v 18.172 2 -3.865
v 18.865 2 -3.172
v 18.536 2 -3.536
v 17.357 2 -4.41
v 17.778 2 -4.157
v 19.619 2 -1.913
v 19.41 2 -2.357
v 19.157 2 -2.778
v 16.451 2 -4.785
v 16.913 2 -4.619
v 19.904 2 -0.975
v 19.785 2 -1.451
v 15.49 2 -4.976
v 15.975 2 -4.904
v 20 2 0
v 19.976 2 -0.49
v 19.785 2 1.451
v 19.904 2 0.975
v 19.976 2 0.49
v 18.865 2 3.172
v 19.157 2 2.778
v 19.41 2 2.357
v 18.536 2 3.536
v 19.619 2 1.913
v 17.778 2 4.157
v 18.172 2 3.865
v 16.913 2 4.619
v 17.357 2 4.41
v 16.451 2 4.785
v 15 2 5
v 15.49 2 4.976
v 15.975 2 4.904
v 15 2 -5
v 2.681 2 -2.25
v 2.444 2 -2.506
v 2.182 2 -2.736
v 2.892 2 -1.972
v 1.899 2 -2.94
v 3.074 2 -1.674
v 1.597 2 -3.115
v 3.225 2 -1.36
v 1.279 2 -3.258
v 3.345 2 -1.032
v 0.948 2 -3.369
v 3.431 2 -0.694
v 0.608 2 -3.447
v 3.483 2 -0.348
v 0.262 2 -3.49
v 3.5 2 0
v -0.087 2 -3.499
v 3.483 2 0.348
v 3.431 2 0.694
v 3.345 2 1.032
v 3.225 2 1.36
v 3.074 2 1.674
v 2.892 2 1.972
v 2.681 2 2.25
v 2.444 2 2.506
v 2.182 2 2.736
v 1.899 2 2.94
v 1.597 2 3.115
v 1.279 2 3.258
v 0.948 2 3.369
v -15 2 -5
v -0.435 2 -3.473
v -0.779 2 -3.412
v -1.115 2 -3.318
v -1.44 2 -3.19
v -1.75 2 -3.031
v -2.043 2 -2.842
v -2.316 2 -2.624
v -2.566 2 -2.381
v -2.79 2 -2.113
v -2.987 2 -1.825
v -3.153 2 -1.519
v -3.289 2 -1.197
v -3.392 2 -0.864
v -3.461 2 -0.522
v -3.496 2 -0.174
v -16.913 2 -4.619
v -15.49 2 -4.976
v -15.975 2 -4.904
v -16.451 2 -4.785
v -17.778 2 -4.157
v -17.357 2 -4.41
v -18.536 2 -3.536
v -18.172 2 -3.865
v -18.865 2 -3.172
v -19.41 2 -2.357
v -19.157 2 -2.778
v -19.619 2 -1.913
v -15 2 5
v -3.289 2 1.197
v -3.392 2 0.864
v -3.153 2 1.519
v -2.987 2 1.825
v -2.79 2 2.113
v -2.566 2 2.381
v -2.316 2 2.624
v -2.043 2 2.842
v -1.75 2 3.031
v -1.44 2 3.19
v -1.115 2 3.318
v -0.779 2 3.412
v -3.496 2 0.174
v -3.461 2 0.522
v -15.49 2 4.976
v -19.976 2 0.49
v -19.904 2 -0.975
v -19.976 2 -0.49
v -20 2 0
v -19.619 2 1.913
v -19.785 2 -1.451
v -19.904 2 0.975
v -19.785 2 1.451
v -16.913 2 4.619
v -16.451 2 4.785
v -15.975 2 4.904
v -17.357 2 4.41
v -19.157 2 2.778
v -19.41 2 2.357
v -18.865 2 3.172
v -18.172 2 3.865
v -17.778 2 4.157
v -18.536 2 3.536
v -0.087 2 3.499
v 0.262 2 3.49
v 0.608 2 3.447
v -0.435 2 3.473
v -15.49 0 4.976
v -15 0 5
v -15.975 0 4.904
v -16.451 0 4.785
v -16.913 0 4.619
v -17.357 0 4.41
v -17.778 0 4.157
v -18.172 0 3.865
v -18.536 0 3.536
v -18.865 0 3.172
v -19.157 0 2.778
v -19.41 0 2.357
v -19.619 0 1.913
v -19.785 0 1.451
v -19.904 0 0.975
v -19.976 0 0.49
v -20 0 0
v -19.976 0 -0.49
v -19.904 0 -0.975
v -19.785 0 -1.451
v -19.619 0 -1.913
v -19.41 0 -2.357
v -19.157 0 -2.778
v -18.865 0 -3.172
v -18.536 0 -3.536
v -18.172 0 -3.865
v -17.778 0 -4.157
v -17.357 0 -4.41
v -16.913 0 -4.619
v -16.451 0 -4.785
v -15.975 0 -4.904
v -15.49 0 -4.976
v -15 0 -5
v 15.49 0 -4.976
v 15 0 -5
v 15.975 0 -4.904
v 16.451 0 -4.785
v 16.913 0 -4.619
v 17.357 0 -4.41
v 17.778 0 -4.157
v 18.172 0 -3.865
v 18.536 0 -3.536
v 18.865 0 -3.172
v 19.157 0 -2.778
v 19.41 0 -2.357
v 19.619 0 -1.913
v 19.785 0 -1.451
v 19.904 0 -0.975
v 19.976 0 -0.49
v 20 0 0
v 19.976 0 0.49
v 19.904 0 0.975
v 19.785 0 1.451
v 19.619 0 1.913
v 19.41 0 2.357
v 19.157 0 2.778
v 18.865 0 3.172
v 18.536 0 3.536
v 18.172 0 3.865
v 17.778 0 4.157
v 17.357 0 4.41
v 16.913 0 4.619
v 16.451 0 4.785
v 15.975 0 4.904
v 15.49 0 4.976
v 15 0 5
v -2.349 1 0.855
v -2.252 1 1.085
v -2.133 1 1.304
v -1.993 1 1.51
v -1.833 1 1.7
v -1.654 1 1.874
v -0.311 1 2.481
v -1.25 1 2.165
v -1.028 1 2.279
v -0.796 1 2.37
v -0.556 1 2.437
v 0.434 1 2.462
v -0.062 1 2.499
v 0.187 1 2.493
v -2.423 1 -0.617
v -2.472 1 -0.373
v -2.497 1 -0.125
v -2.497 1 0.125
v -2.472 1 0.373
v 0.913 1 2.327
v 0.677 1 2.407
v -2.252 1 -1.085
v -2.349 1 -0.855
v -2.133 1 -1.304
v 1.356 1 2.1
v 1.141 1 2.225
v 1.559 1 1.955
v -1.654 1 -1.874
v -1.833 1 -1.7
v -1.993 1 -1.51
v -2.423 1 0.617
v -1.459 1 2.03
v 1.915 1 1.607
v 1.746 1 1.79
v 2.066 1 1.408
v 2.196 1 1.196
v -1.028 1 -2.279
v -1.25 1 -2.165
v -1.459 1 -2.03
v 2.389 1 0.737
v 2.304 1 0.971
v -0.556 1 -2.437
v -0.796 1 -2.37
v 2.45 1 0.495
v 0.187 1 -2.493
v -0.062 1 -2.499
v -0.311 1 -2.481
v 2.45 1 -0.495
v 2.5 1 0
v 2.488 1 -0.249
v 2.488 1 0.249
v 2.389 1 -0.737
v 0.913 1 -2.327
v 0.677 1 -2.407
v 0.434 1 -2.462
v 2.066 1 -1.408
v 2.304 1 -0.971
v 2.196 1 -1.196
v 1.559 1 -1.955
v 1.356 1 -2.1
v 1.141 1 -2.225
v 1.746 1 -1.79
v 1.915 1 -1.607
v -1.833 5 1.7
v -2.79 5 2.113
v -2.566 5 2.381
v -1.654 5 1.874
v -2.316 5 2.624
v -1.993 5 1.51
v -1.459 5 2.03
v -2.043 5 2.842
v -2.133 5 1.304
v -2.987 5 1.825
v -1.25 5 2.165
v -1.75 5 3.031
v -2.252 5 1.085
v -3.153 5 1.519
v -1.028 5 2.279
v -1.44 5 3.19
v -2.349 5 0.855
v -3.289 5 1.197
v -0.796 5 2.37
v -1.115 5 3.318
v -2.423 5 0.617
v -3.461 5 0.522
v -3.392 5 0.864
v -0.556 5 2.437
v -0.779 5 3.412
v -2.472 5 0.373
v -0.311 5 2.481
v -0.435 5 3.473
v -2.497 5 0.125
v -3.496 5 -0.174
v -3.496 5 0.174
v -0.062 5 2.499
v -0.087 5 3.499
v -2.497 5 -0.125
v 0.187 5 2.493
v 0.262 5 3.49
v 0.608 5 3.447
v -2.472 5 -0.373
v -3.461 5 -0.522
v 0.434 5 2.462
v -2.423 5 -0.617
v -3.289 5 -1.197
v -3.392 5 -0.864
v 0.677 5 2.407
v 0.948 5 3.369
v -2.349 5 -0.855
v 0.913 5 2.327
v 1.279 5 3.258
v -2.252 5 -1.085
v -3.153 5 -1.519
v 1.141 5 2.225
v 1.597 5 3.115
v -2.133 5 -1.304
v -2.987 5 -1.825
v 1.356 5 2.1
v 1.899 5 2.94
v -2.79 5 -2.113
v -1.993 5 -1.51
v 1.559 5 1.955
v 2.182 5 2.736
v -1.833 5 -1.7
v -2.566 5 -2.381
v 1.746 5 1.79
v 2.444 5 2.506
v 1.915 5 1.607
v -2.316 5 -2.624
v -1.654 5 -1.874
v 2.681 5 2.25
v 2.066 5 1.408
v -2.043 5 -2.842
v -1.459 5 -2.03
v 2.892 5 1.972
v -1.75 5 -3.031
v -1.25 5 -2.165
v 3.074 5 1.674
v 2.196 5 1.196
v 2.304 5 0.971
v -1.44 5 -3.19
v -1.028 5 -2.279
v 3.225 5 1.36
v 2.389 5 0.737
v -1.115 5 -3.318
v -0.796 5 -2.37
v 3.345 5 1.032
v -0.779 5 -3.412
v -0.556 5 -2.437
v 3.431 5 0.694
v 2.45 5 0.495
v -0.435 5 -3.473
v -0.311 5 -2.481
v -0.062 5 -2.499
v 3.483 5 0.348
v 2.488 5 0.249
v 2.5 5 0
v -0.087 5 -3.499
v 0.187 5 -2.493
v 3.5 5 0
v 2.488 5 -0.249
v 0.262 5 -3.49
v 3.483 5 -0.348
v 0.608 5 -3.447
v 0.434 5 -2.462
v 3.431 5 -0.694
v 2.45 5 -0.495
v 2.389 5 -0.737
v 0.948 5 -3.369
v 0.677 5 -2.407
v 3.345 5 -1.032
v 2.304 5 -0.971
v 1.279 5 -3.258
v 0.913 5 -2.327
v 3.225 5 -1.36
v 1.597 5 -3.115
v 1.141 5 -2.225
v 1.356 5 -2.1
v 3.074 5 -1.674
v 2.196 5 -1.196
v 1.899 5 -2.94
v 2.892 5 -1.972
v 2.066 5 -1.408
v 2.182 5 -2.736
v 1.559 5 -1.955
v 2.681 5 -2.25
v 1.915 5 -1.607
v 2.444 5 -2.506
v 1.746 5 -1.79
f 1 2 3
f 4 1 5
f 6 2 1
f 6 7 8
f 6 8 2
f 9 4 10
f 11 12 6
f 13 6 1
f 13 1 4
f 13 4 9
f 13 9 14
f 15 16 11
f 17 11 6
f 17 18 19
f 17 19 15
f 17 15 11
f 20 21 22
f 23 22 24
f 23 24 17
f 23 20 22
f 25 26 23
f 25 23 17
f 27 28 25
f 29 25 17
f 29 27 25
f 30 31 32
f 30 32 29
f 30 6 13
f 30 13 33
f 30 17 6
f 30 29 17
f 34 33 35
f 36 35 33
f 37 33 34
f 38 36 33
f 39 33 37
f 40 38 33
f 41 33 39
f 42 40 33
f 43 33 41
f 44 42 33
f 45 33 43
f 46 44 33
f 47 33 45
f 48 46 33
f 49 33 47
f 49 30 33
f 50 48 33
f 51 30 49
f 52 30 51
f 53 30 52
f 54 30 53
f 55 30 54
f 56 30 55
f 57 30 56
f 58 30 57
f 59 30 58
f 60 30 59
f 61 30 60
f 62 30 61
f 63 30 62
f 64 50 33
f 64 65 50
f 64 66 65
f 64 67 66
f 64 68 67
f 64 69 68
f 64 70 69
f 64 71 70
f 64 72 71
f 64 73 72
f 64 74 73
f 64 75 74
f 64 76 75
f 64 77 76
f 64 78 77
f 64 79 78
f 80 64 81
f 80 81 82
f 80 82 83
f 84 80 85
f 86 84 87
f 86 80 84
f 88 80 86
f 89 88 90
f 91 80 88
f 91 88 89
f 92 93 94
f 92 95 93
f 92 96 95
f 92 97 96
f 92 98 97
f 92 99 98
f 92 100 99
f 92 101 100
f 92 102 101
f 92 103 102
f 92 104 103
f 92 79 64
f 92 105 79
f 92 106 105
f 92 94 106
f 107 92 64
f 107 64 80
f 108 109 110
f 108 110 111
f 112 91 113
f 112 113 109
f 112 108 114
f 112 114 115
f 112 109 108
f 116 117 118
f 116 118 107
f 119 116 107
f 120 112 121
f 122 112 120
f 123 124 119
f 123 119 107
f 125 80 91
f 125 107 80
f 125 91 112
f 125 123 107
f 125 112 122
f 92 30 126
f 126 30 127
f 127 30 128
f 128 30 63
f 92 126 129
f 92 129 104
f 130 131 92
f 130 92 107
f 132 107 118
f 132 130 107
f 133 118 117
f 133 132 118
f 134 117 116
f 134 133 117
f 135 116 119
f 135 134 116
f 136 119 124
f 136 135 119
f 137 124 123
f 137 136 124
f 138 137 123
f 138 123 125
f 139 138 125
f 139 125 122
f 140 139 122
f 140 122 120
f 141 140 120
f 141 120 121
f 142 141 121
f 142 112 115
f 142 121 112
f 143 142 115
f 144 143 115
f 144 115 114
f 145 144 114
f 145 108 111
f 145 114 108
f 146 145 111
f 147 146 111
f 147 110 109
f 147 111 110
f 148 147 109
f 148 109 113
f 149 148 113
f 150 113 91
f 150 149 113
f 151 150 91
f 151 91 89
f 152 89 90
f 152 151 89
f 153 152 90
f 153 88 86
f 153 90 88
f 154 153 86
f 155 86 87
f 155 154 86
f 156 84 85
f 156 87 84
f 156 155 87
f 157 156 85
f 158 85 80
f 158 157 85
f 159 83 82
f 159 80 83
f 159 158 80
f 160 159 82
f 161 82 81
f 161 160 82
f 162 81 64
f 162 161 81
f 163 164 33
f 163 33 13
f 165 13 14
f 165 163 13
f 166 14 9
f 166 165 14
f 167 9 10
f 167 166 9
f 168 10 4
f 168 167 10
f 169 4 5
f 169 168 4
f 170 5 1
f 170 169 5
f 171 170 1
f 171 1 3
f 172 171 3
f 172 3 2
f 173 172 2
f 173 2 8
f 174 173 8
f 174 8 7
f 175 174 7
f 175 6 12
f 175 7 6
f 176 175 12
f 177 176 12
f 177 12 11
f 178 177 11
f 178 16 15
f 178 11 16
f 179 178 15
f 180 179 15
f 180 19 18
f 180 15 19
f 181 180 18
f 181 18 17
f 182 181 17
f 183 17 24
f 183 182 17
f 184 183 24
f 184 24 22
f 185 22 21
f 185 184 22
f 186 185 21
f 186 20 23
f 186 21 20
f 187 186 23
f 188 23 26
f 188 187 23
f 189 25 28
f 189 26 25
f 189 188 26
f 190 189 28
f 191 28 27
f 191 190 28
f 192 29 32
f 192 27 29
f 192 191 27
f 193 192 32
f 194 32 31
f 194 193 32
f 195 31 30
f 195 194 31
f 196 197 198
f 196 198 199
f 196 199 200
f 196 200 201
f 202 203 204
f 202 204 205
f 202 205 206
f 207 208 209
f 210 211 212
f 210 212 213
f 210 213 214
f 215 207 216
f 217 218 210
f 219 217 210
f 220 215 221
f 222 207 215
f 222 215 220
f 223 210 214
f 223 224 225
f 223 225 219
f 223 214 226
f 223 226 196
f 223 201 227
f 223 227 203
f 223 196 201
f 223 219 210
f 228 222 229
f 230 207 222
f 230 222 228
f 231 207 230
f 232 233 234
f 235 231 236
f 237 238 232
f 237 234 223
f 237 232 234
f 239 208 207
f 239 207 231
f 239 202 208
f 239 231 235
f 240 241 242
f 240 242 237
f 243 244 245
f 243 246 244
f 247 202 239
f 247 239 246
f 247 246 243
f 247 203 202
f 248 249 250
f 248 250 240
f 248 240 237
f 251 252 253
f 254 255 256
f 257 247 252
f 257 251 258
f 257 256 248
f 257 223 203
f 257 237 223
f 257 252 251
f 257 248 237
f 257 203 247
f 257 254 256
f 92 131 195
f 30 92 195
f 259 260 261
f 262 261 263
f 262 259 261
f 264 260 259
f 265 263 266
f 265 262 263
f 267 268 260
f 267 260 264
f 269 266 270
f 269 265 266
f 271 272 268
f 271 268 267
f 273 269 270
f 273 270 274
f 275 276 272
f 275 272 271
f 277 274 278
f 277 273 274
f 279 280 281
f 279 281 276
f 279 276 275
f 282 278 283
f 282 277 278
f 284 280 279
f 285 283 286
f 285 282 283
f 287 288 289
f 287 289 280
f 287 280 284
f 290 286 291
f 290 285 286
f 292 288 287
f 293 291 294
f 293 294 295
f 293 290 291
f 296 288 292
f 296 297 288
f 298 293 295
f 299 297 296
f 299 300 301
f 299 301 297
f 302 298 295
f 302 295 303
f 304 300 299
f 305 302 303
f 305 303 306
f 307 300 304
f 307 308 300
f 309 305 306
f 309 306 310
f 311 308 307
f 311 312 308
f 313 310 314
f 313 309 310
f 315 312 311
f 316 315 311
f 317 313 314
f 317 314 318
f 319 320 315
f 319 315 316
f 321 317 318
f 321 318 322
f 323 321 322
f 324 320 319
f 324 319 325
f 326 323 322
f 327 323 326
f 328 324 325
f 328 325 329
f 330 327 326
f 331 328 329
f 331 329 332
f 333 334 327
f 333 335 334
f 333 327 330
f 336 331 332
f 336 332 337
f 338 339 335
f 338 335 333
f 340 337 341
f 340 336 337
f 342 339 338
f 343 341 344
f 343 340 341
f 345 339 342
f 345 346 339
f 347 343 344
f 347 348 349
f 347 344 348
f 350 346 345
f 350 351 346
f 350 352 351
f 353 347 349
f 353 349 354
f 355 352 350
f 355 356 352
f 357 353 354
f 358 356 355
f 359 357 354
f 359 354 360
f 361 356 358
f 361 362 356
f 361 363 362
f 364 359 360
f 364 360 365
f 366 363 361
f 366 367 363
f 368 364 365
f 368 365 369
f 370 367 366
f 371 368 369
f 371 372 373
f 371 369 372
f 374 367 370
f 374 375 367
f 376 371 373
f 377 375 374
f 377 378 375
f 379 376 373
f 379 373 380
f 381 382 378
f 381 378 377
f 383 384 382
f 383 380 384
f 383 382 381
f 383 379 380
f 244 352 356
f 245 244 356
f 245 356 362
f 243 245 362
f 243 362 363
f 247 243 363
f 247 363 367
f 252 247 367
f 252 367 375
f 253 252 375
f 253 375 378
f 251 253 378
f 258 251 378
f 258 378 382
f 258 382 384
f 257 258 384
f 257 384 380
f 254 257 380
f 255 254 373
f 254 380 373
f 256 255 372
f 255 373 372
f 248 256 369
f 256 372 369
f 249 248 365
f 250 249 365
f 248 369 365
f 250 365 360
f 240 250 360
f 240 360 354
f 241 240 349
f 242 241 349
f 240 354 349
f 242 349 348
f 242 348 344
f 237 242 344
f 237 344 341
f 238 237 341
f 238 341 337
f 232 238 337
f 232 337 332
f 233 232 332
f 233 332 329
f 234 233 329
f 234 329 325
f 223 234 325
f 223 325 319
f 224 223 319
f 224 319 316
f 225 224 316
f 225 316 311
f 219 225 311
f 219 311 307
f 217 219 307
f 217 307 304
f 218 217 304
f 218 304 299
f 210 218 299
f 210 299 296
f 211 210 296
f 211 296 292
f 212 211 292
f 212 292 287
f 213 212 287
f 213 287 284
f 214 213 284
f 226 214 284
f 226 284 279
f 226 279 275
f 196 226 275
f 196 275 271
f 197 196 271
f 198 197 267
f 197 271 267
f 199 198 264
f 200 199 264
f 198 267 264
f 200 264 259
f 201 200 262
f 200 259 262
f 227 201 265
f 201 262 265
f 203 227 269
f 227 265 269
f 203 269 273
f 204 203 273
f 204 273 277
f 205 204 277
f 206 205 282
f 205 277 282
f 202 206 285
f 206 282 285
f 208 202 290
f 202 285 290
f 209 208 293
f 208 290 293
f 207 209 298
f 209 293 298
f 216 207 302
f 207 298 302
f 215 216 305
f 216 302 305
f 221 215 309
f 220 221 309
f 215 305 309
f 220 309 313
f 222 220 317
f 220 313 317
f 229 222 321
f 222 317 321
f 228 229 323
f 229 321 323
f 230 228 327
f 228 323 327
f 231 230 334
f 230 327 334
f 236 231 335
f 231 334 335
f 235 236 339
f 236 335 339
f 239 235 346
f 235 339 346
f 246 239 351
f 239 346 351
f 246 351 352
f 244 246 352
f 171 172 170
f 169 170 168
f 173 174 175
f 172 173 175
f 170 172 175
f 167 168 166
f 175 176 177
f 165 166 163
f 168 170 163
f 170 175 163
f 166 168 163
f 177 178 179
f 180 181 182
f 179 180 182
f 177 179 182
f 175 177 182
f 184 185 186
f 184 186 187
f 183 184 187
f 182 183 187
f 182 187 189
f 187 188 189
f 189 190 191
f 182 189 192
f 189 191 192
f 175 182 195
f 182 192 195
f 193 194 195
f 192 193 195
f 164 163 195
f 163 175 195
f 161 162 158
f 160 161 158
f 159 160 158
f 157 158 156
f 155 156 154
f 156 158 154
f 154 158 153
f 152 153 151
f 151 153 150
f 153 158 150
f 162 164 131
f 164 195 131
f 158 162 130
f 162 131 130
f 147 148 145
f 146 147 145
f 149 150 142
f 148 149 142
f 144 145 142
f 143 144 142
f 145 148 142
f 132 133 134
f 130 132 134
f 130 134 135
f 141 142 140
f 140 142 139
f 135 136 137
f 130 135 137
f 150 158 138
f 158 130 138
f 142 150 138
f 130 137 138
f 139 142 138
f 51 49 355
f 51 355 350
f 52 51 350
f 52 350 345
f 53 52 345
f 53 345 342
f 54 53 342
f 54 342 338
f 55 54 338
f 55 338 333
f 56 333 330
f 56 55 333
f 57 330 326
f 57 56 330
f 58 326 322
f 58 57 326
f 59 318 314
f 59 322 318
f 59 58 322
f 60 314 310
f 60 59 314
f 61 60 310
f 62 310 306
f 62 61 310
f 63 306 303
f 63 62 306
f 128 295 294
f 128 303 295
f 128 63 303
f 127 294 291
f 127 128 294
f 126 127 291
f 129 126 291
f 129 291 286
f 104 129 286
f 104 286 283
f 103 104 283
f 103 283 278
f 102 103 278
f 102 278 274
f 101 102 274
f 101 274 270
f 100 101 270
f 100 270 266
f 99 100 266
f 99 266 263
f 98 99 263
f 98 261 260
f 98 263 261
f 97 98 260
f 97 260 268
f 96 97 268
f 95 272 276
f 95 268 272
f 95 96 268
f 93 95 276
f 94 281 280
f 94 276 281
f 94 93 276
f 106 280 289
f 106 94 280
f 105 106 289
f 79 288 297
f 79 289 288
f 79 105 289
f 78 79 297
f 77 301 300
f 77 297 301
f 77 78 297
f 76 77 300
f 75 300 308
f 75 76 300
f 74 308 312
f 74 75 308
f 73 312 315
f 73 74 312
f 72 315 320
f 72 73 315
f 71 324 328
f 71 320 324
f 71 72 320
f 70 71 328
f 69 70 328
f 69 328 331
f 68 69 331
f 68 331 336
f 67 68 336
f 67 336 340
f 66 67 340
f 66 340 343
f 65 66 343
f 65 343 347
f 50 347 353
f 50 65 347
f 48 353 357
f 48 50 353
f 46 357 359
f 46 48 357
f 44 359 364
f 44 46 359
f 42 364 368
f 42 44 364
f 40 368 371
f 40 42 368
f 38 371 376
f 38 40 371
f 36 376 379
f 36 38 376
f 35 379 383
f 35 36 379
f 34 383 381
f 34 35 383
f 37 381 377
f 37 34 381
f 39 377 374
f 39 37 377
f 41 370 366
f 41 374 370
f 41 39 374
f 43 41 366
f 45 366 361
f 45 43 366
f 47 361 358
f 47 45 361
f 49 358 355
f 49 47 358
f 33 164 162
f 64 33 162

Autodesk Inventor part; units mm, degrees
ref_plane "YZ Plane" through (0, 0, 0) normal (1, 0, 0) x (0, 1, 0)
ref_plane "XZ Plane" through (0, 0, 0) normal (0, 1, 0) x (-1, 0, 0)
ref_plane "XY Plane" through (0, 0, 0) normal (0, 0, 1) x (1, 0, 0)
sketch "Sketch1" plane through (0, 0, 0) normal (0, 1, 0) x (-1, 0, 0)
  line L0 (15, 0) -> (-15, 0) construction
  line L1 (15, 5) -> (-15, 5)
  line L2 (-15, -5) -> (15, -5)
  arc A0 (15, -5) -> (15, 5) centre (15, 0) ccw
  arc A1 (-15, 5) -> (-15, -5) centre (-15, 0) ccw
  point P0 (0, 0)
  dimension "d0" = 15
  dimension "d1" = 10
extrude "Extrusion1" add sketch "Sketch1" along normal blind 2
sketch "Sketch2" plane through (0, 2, 0) normal (0, 1, 0) x (1, 0, 0)
  circle A0 centre (0, 0) radius 3.5
  dimension "d4" = 7
extrude "Extrusion2" add sketch "Sketch2" along normal blind 3
sketch "Sketch3" plane through (0, 5, 0) normal (0, 1, 0) x (1, 0, 0)
  circle A0 centre (0, 0) radius 2.5
  dimension "d7" = 5
extrude "Extrusion3" cut sketch "Sketch3" against normal blind 4
properties part number "tang"
